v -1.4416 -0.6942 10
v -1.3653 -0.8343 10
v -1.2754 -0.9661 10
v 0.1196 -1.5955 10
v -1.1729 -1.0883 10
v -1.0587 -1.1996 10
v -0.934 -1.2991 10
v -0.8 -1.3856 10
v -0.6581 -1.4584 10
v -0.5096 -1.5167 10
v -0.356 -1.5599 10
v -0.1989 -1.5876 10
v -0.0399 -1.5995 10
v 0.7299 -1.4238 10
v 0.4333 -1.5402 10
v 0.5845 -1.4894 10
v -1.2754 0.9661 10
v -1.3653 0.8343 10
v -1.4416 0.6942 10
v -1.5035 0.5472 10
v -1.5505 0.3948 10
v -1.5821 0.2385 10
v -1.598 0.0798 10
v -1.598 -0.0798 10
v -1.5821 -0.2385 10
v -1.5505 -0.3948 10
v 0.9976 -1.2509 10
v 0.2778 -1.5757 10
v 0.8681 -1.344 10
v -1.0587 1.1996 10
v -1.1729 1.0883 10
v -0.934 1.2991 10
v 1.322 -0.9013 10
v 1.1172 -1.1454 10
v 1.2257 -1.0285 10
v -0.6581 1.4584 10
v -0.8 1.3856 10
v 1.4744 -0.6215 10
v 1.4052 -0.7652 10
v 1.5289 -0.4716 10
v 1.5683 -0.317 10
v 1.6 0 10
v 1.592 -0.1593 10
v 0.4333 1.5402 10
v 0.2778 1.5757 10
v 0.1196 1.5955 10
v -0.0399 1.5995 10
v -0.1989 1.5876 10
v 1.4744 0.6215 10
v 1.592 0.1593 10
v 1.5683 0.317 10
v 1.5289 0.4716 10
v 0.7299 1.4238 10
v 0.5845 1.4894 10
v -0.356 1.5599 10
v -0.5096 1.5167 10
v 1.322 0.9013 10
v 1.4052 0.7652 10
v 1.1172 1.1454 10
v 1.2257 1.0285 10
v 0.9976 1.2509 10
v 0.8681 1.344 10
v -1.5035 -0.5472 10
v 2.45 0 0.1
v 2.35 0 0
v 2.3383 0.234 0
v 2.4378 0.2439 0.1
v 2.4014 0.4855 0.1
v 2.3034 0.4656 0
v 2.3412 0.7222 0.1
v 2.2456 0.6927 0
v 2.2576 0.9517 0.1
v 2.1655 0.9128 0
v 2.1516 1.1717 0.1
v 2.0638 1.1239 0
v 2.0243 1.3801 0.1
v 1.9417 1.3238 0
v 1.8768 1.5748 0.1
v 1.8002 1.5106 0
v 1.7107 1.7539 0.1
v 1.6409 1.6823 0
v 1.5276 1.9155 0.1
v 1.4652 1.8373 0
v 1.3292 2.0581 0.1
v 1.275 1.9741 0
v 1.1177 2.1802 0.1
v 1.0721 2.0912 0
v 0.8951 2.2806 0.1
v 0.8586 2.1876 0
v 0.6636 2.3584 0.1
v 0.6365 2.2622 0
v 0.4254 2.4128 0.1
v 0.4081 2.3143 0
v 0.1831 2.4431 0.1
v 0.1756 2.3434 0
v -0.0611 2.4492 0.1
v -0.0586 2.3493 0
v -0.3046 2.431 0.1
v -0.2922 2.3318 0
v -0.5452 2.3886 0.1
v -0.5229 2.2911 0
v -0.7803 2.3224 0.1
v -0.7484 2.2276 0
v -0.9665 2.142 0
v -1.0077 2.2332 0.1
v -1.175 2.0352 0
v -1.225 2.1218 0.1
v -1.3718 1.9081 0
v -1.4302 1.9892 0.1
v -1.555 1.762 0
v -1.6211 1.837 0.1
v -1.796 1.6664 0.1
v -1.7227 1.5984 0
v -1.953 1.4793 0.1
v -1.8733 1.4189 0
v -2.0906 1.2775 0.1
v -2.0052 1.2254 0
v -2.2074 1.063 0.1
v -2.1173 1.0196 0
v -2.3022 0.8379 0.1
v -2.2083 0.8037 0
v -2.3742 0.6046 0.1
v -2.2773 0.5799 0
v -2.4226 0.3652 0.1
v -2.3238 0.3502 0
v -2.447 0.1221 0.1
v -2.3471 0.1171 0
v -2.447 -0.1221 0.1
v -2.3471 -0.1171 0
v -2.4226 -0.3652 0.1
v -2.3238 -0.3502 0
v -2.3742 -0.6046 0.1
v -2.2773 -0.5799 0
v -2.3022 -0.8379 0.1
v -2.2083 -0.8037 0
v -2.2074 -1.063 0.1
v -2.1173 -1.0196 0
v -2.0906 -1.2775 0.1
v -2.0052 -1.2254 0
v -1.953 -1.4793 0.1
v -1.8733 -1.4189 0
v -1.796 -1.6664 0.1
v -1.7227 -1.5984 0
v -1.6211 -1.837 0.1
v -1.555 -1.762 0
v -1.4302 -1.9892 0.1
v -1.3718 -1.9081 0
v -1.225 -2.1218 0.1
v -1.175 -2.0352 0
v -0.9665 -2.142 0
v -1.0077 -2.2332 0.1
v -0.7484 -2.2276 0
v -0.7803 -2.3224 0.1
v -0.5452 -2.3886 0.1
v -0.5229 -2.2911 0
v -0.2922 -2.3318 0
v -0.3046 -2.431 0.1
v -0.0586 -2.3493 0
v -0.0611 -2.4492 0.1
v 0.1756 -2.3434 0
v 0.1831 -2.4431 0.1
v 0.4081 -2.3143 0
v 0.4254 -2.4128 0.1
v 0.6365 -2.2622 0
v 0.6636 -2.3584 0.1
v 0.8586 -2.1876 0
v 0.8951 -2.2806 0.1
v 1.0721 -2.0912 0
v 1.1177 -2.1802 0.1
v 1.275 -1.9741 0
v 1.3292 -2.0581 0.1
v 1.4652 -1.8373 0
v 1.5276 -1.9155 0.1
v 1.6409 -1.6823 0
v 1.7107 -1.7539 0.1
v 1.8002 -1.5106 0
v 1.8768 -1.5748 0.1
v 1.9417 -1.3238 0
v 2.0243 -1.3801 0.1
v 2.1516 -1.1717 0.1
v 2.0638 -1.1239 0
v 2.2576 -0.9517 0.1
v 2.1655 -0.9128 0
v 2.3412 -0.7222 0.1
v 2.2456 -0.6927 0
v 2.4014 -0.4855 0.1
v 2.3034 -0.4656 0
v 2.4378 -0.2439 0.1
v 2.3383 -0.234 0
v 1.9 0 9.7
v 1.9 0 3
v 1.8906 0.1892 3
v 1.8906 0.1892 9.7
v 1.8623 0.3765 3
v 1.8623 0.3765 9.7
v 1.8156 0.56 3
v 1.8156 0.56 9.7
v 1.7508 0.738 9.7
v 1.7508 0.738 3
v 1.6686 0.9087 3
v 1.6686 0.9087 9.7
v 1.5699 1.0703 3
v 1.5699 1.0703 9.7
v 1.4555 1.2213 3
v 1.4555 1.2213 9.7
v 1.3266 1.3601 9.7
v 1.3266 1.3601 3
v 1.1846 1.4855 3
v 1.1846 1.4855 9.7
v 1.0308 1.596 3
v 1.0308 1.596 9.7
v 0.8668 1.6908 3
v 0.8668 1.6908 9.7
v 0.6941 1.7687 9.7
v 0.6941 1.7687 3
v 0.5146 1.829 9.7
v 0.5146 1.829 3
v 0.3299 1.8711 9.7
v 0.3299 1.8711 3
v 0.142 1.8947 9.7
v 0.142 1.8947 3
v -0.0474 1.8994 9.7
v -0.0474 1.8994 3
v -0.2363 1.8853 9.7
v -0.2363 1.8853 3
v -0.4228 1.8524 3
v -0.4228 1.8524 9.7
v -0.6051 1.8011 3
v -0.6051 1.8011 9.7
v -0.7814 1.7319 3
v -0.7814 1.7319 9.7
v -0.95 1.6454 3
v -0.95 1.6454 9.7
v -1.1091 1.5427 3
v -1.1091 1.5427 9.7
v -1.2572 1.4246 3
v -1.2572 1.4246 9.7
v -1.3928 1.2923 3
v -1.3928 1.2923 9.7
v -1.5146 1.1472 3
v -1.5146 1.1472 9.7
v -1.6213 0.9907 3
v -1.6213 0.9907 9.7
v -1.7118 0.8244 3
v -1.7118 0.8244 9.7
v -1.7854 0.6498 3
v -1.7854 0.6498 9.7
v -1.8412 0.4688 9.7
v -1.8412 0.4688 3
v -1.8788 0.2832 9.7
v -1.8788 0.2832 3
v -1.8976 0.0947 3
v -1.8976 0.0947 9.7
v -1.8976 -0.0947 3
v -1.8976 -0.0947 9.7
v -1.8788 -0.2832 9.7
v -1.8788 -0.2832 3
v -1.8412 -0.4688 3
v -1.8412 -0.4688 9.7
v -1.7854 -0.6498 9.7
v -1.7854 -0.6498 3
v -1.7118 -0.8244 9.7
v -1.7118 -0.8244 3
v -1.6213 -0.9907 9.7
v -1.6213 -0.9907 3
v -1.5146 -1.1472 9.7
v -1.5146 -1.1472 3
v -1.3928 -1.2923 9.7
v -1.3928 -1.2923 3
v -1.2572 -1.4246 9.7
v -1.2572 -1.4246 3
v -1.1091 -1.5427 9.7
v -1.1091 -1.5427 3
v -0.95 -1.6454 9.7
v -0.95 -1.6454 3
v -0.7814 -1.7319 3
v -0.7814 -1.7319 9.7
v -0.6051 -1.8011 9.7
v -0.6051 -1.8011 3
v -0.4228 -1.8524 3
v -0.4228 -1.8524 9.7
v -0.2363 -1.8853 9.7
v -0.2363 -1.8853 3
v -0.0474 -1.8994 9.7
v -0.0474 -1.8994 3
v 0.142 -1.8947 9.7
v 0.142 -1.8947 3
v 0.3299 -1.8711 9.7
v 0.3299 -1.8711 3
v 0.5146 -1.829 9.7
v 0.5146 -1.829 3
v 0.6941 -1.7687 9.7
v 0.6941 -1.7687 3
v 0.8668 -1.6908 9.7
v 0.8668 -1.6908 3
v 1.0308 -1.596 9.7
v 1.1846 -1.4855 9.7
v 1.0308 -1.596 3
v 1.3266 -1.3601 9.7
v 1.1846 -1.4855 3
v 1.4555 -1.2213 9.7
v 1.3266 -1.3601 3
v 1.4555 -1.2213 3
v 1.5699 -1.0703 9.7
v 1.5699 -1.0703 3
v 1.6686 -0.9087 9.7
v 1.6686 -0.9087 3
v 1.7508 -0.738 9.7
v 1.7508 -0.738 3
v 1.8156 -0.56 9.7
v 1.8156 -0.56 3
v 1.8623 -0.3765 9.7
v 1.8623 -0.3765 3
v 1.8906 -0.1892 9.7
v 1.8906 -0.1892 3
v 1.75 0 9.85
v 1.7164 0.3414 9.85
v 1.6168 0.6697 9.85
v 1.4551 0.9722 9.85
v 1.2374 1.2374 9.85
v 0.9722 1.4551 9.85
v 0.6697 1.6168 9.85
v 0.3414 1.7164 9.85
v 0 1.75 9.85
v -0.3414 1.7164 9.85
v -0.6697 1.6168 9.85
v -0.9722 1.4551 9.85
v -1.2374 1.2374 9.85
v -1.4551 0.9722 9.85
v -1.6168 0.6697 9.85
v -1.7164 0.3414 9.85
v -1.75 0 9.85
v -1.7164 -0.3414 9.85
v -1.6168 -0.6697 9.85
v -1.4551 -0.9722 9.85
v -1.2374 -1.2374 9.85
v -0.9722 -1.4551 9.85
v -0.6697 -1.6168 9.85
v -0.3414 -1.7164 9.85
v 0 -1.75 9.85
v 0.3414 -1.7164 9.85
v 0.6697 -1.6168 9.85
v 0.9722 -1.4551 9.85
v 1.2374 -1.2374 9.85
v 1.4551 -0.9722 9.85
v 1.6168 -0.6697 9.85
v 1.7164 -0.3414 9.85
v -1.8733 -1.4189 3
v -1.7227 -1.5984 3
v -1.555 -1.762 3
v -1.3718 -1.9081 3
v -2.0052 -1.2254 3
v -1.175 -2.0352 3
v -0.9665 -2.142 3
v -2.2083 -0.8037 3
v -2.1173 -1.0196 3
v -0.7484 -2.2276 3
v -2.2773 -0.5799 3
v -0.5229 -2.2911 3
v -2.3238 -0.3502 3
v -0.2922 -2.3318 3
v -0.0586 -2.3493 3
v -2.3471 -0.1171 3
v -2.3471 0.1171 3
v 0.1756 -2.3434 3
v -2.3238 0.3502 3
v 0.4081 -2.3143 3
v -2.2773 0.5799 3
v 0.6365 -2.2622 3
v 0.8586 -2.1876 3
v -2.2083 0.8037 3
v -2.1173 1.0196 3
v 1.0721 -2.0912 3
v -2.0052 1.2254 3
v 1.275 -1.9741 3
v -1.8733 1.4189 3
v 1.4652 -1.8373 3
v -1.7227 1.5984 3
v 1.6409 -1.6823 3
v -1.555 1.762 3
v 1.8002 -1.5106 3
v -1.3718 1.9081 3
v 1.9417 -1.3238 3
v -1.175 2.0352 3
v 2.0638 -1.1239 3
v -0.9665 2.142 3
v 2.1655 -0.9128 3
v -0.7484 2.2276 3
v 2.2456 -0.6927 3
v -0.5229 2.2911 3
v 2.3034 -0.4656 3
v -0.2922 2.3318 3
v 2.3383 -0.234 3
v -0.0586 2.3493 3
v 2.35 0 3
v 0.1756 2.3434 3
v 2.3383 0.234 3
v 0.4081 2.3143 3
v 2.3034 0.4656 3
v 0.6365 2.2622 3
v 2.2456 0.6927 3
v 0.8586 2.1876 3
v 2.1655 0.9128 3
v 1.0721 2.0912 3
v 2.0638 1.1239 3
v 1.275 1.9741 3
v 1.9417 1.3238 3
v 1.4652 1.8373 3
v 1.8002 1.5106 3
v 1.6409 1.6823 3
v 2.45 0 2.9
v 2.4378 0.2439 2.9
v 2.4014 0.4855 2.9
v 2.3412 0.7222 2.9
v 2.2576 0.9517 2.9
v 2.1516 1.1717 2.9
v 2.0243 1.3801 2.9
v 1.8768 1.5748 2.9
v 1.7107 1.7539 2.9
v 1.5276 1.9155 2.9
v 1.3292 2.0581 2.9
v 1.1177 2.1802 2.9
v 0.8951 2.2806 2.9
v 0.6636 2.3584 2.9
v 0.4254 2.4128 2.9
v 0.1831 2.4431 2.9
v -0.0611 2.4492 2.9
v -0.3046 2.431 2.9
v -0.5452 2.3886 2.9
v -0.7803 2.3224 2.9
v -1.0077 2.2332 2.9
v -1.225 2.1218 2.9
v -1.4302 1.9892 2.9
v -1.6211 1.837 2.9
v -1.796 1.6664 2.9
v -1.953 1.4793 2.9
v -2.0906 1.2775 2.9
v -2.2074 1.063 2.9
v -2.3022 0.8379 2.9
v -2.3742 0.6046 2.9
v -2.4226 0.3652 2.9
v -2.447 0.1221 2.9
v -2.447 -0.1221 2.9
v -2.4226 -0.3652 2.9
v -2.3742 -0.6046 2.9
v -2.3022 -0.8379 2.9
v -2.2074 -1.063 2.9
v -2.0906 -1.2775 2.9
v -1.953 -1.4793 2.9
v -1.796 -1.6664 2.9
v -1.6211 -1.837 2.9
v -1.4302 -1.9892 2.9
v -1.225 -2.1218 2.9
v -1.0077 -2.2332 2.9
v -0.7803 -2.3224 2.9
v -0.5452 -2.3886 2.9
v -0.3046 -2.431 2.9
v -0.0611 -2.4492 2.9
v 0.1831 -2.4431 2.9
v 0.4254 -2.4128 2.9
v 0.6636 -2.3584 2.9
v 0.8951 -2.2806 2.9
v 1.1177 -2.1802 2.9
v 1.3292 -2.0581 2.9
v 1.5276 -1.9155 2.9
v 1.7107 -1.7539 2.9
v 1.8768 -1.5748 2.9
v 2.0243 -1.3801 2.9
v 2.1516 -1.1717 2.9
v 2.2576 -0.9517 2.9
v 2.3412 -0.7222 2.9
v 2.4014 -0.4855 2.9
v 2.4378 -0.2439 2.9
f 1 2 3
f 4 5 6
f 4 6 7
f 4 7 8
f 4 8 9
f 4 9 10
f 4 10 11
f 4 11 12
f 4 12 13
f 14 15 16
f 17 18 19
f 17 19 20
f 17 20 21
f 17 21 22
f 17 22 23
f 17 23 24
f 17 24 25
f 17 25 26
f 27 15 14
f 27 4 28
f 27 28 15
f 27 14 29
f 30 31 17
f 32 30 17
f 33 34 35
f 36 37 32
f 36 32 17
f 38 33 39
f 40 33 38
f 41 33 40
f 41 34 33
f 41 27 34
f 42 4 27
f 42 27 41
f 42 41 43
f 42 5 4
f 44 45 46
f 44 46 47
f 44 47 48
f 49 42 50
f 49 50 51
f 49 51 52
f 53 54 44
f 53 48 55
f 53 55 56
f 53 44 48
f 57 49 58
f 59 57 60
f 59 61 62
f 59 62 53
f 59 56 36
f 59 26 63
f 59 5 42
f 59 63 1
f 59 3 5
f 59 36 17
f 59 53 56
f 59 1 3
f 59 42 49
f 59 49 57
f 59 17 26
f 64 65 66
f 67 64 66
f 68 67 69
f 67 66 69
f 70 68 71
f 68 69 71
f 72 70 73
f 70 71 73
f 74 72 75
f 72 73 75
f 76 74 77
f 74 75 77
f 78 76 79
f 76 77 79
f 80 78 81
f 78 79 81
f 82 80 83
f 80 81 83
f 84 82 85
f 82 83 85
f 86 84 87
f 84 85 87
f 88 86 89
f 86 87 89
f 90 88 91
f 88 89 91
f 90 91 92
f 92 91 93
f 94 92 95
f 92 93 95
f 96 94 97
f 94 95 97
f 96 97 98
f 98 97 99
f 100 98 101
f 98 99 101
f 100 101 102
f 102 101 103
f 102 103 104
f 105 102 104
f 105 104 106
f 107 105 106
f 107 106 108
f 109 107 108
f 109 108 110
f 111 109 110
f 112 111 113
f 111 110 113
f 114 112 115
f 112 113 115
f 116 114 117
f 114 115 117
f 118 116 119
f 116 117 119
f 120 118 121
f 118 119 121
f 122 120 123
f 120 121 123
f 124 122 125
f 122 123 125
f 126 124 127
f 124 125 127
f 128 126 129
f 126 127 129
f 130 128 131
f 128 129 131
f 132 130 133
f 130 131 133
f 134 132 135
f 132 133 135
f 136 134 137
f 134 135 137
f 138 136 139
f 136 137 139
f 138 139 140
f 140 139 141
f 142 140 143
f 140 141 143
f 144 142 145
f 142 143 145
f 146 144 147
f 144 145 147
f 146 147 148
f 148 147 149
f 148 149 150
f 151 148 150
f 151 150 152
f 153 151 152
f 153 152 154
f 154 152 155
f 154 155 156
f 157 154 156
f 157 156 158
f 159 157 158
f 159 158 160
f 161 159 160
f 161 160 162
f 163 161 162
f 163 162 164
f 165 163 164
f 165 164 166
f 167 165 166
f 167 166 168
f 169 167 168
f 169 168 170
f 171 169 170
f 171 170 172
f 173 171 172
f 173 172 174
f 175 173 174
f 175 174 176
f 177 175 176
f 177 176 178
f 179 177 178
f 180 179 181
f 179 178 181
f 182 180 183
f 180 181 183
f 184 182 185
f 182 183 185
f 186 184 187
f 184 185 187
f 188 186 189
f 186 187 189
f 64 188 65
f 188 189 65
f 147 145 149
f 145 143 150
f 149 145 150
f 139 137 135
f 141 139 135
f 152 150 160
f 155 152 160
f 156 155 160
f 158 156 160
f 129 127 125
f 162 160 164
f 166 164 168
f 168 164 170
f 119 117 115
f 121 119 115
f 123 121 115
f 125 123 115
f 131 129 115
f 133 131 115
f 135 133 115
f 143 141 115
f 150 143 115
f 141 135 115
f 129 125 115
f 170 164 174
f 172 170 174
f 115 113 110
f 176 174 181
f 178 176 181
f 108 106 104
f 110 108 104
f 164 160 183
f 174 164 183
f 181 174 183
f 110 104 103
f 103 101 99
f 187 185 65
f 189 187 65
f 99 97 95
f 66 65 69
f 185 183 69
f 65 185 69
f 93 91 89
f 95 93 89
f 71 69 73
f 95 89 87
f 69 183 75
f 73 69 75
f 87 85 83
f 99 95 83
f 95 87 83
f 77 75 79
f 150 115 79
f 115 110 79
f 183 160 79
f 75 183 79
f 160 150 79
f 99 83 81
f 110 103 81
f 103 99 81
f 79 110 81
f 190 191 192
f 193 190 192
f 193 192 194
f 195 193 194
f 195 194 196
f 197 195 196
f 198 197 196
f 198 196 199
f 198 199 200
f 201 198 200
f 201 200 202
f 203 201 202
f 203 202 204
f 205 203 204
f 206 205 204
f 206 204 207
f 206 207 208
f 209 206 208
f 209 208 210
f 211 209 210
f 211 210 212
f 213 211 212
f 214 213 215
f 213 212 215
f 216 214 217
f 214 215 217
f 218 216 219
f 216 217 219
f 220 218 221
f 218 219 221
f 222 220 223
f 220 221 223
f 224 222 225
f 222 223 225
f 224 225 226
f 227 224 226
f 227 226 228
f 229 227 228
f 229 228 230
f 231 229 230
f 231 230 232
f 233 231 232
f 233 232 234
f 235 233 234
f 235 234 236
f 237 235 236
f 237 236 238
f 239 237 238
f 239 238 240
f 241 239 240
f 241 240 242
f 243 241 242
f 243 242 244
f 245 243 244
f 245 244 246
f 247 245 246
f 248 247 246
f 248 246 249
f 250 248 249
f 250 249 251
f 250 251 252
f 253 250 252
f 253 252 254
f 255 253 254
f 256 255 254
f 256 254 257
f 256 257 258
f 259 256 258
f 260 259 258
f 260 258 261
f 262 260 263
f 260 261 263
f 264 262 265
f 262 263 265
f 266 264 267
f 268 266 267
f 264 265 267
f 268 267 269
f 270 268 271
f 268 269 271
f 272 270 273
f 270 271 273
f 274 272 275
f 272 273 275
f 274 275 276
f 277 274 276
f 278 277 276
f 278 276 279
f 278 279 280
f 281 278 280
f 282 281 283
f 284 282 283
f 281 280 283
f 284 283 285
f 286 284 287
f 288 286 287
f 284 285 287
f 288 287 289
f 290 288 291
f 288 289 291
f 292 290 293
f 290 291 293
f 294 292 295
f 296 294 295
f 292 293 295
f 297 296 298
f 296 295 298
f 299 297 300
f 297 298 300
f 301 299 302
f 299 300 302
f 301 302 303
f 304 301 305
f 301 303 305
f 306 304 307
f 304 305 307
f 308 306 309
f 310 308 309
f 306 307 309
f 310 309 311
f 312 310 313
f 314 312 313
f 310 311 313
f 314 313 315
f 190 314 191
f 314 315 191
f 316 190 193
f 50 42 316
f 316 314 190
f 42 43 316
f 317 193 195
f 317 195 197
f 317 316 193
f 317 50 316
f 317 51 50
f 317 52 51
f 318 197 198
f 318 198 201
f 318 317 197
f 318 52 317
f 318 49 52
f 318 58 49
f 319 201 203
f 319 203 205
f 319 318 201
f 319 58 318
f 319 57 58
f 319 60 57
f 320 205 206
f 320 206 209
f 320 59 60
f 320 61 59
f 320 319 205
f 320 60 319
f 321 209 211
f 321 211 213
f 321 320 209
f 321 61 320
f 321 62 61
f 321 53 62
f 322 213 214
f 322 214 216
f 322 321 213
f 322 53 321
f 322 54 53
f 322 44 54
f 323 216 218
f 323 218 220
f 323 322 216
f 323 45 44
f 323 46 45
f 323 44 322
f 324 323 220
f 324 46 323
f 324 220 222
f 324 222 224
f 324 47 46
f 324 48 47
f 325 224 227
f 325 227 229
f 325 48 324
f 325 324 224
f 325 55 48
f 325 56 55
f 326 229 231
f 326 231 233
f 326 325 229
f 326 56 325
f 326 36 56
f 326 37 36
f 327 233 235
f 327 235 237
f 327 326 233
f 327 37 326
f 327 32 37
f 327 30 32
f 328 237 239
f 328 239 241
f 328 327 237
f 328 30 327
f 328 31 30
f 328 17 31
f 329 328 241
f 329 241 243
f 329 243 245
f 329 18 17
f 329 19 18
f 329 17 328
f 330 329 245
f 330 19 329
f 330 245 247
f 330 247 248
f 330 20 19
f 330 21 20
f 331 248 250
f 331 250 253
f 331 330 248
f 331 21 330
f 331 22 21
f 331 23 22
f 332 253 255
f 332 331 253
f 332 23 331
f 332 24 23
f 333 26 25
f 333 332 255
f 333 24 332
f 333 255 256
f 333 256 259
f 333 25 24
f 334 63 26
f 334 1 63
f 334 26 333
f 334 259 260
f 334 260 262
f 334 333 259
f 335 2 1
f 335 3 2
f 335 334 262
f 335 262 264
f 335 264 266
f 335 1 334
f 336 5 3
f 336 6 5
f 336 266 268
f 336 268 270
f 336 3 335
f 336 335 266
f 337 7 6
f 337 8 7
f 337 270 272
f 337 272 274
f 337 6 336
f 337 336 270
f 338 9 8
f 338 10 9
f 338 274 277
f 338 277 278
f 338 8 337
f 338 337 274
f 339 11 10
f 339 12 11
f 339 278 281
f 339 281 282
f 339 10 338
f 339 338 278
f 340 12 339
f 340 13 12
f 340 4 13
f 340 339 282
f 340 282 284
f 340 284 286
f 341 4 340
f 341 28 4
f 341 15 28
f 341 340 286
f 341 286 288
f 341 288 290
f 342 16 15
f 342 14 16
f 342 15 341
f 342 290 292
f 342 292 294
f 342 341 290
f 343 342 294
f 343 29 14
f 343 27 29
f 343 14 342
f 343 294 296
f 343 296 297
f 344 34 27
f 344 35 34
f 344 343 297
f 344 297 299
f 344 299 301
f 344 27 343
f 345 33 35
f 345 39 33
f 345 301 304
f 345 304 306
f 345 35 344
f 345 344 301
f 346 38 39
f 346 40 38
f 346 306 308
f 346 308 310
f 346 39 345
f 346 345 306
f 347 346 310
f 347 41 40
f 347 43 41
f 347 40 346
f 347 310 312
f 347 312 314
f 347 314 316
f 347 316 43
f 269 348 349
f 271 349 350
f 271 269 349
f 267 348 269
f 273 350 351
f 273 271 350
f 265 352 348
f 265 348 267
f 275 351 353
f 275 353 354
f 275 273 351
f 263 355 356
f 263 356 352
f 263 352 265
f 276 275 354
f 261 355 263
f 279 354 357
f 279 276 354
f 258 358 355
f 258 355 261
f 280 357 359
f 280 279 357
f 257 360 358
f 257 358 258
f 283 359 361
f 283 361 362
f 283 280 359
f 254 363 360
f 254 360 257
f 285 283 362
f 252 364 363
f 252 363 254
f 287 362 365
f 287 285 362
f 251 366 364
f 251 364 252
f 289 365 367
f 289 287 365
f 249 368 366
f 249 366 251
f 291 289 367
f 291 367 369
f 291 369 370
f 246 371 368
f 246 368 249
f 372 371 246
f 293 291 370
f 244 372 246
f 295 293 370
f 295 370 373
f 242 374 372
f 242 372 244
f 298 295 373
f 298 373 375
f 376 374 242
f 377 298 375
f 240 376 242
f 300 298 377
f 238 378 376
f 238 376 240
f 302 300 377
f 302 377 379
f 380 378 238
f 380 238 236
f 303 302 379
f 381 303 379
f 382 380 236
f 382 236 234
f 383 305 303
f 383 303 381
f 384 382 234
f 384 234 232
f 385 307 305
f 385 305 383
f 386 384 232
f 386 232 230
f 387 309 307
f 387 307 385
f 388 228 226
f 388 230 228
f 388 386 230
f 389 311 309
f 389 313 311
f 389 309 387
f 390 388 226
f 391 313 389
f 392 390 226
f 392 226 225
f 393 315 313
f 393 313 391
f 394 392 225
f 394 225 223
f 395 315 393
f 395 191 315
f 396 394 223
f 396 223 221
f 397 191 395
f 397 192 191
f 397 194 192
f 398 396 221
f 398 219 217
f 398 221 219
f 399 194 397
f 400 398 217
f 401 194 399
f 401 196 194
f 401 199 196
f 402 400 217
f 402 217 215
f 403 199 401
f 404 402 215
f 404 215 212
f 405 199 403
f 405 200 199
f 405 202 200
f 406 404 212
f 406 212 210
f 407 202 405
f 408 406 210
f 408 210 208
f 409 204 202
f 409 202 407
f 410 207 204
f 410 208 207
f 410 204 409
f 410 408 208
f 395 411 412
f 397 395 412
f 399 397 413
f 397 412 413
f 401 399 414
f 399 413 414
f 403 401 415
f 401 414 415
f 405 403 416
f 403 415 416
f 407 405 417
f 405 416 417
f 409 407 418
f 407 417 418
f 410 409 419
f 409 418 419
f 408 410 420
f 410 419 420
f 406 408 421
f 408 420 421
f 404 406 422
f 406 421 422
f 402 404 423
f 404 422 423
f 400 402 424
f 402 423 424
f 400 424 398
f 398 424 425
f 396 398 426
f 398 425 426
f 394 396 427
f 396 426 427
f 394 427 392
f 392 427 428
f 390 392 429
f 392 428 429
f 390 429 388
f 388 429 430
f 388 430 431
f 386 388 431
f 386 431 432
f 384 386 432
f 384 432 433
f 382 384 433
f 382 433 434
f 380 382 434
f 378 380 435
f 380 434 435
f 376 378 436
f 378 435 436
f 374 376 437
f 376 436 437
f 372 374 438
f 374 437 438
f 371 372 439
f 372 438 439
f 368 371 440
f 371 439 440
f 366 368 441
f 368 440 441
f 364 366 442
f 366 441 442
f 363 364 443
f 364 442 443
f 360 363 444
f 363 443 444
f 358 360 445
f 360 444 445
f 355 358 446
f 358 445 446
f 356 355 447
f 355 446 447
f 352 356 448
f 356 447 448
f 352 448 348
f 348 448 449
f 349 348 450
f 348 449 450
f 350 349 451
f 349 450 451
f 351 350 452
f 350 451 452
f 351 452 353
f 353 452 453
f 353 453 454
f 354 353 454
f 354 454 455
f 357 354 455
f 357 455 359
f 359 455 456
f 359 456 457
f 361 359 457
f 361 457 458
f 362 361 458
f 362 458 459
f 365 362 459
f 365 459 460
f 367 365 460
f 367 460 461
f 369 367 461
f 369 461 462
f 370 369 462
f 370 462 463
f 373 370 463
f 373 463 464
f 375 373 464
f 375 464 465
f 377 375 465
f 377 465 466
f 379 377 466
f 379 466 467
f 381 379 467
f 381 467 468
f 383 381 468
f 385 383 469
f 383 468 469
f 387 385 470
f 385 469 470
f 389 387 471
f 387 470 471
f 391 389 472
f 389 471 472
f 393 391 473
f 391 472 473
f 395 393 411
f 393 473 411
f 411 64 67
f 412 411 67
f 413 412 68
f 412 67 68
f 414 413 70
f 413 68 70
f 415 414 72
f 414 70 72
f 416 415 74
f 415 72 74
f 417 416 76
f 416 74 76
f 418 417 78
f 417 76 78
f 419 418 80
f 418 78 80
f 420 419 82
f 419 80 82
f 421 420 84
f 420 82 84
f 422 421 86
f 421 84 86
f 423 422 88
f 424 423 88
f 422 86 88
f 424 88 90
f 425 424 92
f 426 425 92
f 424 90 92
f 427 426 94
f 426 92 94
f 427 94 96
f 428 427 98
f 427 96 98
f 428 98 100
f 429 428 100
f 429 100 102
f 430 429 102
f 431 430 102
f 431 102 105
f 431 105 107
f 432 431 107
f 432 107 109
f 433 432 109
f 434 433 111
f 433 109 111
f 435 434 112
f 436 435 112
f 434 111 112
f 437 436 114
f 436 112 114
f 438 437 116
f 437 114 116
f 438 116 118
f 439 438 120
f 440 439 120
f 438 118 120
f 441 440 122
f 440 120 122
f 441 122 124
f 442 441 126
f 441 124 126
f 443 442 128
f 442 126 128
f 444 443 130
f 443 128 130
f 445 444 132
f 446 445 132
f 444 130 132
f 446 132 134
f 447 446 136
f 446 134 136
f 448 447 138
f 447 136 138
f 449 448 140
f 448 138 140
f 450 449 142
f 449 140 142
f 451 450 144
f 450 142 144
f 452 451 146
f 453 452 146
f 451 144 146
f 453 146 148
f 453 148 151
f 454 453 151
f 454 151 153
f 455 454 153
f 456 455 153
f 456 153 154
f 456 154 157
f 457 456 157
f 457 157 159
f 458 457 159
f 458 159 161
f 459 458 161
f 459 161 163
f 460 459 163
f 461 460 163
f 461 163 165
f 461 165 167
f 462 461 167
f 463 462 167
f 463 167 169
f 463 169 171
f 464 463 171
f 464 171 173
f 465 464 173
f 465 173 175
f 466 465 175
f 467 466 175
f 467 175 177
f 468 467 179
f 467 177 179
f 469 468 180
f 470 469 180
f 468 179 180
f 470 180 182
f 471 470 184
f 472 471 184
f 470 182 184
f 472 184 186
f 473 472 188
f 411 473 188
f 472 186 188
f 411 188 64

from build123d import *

# Parameters (mm, degrees)
F0_R     = 1.9
F1_DEPTH = 10
F0_R_2   = 2.45
F2_DEPTH = 3
F3_SIZE  = 0.3
F4_SIZE  = 0.1


with BuildPart() as f1:
    # F0 (on Top) → F1 (new body)
    with BuildSketch(Plane.XY):
        Circle(F0_R)
    extrude(amount=F1_DEPTH)

    # F0 (on Top) → F2 (join)
    with BuildSketch(Plane.XY):
        Circle(F0_R_2)
        Circle(F0_R, mode=Mode.SUBTRACT)
    extrude(amount=F2_DEPTH)

    # F3
    f3_edges = [f1.edges().sort_by_distance(p)[0] for p in [
        (-1.9, 0, 10),
    ]]
    chamfer(f3_edges, length=F3_SIZE)

    # F4
    f4_edges = [f1.edges().sort_by_distance(p)[0] for p in [
        (-2.45, 0, 0),
        (-2.45, 0, 3),
    ]]
    chamfer(f4_edges, length=F4_SIZE)


solid = f1.part
